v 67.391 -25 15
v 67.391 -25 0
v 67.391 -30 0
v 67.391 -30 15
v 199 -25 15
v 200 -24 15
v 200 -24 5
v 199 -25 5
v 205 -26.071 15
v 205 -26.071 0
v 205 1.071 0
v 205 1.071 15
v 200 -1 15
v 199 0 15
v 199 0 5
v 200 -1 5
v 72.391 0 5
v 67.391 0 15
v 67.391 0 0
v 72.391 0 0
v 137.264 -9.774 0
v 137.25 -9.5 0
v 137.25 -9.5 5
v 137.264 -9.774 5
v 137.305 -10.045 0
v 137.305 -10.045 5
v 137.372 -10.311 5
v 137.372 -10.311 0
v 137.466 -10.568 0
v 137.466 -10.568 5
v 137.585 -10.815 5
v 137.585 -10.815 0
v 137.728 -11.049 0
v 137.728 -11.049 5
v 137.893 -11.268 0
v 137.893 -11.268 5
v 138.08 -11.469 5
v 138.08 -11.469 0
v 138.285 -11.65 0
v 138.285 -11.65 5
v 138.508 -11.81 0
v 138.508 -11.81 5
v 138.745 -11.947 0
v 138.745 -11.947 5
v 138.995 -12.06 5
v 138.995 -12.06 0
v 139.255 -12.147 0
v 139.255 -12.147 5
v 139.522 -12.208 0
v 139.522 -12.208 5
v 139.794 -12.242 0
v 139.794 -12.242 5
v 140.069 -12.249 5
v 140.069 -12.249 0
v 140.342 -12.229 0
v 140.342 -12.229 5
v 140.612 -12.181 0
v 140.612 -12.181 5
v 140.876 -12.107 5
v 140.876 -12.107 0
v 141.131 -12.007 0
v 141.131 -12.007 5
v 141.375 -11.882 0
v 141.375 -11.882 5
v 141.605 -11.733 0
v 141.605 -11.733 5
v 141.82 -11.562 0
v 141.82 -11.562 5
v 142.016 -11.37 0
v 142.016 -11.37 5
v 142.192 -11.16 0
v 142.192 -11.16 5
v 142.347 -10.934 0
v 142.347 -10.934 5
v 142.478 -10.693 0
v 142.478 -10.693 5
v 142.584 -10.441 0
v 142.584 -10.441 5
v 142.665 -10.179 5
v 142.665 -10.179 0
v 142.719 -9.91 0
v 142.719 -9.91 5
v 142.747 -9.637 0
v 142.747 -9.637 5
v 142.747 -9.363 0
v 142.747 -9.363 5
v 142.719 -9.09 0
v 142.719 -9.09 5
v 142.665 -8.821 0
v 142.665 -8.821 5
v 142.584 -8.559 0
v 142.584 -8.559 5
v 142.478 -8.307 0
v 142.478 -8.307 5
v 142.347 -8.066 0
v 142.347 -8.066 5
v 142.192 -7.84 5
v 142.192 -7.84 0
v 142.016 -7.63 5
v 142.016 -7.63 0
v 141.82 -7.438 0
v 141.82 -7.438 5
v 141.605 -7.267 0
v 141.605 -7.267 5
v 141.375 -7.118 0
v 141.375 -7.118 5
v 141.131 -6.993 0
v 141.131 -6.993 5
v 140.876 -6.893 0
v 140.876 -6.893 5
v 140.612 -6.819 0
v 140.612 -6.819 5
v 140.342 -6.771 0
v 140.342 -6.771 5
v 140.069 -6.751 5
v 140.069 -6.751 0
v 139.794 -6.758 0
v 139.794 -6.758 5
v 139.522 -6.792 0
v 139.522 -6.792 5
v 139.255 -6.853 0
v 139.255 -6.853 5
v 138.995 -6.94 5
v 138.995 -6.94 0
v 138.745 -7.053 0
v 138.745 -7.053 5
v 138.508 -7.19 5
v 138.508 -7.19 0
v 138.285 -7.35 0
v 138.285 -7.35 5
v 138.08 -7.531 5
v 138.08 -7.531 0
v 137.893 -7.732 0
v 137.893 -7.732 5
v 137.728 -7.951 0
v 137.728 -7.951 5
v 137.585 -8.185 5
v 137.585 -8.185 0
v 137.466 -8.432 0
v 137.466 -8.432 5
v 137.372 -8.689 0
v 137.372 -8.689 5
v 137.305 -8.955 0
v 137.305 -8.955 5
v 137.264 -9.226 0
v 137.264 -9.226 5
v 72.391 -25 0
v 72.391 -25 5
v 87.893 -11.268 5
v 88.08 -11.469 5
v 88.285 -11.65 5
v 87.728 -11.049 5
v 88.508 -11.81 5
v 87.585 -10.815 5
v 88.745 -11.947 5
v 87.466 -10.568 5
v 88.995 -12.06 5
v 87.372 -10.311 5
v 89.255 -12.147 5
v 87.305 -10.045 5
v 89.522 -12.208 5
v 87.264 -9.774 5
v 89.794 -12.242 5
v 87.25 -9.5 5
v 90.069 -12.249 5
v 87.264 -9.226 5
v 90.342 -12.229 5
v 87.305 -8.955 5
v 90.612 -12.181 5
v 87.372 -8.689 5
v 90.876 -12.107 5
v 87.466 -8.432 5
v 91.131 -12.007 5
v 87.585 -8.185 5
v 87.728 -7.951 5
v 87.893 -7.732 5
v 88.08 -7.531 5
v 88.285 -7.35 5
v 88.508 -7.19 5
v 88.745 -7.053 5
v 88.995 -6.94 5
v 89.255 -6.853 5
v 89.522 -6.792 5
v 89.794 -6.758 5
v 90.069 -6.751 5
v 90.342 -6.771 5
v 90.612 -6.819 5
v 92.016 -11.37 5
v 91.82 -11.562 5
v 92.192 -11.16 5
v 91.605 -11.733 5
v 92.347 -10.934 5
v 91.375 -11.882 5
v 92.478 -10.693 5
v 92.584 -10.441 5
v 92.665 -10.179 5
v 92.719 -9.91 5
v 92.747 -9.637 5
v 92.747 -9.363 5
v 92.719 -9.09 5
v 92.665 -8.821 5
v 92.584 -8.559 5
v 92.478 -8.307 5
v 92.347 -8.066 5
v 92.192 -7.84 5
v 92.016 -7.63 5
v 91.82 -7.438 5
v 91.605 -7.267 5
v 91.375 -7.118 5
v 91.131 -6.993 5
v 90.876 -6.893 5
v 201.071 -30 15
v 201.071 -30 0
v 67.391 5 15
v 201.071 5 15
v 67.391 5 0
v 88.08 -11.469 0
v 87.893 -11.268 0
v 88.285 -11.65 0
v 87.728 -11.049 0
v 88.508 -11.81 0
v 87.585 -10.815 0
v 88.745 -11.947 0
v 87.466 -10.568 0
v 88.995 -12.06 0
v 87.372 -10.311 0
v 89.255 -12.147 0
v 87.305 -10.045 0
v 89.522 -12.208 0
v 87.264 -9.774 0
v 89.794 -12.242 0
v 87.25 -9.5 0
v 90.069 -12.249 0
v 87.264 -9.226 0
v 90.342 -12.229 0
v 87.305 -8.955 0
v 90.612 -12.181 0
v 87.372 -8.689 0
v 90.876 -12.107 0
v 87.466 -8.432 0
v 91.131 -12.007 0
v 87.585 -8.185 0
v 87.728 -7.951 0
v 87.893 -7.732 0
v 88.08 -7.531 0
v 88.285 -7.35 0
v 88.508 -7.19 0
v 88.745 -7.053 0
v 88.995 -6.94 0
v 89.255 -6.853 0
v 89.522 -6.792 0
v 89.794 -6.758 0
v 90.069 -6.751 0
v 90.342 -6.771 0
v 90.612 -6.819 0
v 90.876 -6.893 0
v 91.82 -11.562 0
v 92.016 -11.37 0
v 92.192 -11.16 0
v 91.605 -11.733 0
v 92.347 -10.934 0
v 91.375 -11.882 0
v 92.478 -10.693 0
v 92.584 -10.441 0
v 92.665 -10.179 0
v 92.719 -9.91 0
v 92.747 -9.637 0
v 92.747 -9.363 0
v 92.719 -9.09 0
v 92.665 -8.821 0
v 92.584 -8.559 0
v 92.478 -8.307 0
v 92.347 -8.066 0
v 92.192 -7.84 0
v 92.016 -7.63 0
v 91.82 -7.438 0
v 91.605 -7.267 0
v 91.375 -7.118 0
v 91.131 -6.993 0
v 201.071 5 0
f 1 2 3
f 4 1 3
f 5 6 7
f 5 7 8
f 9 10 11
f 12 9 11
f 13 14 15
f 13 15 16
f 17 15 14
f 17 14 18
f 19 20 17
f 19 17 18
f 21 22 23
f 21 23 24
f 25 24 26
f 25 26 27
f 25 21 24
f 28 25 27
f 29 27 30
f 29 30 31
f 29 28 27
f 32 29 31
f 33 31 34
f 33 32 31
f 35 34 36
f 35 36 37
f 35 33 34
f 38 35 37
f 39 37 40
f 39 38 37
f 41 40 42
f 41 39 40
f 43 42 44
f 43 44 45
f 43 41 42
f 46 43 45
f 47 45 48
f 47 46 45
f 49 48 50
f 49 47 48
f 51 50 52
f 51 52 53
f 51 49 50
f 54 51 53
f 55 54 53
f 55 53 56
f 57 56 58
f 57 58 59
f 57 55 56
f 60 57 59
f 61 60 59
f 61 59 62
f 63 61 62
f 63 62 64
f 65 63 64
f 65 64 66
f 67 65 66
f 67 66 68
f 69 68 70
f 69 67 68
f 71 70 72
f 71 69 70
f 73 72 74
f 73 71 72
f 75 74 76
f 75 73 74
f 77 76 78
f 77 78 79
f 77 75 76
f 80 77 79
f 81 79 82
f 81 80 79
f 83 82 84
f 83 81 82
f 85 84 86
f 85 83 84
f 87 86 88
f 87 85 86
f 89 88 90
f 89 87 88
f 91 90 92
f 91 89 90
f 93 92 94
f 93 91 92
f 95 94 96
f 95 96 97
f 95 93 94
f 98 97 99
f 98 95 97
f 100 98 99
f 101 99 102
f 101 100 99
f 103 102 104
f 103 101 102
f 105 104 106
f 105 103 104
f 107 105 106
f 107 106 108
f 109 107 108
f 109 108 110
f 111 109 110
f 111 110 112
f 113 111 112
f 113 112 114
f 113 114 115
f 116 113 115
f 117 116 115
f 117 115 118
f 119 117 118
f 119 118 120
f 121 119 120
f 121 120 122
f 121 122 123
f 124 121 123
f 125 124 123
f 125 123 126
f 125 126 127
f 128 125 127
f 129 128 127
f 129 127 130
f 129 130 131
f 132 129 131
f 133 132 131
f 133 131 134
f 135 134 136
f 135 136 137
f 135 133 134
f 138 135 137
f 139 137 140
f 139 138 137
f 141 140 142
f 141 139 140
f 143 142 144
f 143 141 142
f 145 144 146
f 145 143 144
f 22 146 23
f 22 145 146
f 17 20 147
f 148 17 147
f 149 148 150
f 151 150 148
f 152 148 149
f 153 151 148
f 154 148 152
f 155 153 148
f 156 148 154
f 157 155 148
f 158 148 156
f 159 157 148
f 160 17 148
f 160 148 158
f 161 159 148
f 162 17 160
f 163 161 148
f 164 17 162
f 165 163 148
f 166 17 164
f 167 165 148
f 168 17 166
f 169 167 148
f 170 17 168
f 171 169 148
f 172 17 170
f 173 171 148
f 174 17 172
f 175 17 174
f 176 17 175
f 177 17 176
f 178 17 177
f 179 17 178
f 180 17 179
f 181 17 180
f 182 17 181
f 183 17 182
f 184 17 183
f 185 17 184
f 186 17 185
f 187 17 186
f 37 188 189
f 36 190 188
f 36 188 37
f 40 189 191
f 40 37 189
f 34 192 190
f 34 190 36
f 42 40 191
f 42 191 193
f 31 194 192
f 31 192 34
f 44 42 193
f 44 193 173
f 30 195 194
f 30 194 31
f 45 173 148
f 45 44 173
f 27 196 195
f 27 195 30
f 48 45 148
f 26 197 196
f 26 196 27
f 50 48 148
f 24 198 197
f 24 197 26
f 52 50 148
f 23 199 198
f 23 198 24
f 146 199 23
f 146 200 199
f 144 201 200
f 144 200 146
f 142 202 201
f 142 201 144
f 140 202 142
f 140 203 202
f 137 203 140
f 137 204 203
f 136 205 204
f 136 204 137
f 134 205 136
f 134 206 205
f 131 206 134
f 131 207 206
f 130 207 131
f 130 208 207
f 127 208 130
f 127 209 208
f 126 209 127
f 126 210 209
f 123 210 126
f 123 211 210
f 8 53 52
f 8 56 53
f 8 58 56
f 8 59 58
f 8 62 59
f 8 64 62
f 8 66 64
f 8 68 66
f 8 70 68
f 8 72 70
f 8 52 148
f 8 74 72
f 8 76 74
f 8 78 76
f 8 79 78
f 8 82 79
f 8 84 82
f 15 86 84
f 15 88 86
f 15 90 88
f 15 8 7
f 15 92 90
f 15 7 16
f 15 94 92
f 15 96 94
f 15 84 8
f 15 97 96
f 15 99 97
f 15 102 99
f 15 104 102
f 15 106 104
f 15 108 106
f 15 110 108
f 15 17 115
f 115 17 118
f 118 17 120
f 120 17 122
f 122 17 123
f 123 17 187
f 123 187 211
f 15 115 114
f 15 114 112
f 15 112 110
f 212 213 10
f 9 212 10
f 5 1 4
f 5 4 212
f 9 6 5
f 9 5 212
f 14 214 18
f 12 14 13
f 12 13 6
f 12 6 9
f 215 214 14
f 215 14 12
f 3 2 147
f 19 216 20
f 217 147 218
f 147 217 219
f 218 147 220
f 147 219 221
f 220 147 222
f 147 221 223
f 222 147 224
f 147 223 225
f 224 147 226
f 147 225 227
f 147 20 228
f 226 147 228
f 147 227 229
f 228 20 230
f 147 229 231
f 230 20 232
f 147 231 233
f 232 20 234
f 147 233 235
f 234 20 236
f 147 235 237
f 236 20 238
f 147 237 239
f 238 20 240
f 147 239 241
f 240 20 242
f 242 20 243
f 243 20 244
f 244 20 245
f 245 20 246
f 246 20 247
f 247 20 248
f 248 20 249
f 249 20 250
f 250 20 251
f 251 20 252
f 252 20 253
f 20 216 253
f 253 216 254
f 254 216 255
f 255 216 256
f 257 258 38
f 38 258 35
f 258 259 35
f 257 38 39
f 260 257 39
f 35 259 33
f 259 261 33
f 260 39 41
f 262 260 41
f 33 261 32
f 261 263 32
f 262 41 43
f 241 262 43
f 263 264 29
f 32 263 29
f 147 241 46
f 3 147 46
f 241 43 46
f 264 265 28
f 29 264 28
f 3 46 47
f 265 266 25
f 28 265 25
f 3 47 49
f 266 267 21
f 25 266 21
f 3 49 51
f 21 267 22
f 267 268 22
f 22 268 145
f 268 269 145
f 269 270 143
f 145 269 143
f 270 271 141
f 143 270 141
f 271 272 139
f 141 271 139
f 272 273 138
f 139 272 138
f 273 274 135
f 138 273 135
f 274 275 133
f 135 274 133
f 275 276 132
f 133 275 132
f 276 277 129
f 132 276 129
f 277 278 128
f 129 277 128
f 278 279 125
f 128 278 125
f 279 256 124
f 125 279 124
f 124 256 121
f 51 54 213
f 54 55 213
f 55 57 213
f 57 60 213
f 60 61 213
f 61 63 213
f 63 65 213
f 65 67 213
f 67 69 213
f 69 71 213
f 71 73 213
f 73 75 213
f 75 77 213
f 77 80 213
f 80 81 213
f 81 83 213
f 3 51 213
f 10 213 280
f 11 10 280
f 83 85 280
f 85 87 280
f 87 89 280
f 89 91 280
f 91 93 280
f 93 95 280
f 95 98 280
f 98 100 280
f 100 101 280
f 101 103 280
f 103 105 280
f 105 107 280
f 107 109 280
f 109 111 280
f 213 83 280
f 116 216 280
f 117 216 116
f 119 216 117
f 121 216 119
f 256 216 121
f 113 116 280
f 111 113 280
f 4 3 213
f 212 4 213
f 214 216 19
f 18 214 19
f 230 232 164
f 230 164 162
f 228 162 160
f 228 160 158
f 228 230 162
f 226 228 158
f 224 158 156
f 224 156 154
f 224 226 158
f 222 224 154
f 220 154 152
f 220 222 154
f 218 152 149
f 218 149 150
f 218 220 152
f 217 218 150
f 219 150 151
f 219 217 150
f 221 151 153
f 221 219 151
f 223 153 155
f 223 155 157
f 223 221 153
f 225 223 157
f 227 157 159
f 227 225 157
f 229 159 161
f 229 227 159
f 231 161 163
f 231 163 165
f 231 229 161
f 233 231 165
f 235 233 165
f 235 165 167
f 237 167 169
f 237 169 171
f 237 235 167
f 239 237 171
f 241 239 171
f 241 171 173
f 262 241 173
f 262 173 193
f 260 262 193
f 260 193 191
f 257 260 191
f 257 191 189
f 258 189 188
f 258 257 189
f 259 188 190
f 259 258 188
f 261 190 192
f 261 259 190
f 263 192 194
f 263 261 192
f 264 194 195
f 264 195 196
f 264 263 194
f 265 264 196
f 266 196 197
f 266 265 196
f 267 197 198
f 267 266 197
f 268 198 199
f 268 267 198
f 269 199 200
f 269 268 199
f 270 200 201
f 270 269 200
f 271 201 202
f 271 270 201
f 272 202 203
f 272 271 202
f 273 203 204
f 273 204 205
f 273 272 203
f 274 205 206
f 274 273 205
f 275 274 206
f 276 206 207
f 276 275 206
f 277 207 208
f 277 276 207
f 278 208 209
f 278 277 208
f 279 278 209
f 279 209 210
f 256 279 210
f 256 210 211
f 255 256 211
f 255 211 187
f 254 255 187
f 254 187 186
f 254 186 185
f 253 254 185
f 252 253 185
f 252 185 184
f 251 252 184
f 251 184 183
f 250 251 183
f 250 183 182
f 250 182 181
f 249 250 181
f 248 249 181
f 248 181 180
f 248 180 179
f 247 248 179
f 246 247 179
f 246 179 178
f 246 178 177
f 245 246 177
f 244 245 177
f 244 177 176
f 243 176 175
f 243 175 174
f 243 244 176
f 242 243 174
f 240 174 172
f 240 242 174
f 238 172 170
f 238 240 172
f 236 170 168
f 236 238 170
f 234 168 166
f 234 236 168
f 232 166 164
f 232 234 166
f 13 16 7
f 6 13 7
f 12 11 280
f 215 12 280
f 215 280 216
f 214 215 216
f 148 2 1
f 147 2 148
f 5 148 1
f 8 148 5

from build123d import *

# Parameters (mm, degrees)
SKETCH1_R           = 2.75
BOSS_EXTRUDE1_DEPTH = 5
BOSS_EXTRUDE4_DEPTH = 15


with BuildPart() as part:
    # Sketch1 → Boss-Extrude1 (new body)
    with BuildSketch(Plane.XY):
        Polygon((72.390908062, 0), (72.390908062, -25), (195, -25), (199, -25), (200, -24), (200, -1), (199, 0), (195, 0), align=None)
        with Locations(Location((90, -9.5, 0), (0, 0, 180))):
            Circle(SKETCH1_R, mode=Mode.SUBTRACT)
        with Locations(Location((140, -9.5, 0), (0, 0, 180))):
            Circle(SKETCH1_R, mode=Mode.SUBTRACT)
    extrude(amount=BOSS_EXTRUDE1_DEPTH)

    # Sketch2 → Boss-Extrude4 (add)
    with BuildSketch(Plane(origin=(0, 0, 0), x_dir=(-1, 0, 0), z_dir=(0, 0, -1))):
        Polygon((-72.390908062, 0), (-199, 0), (-200, -1), (-200, -24), (-199, -25), (-72.390908062, -25), (-67.390908062, -25), (-67.390908062, -30), (-201.071067812, -30), (-205, -26.071067812), (-205, 1.071067812), (-201.071067812, 5), (-67.390908062, 5), (-67.390908062, 0), align=None)
    extrude(amount=-BOSS_EXTRUDE4_DEPTH)


solid = part.part
